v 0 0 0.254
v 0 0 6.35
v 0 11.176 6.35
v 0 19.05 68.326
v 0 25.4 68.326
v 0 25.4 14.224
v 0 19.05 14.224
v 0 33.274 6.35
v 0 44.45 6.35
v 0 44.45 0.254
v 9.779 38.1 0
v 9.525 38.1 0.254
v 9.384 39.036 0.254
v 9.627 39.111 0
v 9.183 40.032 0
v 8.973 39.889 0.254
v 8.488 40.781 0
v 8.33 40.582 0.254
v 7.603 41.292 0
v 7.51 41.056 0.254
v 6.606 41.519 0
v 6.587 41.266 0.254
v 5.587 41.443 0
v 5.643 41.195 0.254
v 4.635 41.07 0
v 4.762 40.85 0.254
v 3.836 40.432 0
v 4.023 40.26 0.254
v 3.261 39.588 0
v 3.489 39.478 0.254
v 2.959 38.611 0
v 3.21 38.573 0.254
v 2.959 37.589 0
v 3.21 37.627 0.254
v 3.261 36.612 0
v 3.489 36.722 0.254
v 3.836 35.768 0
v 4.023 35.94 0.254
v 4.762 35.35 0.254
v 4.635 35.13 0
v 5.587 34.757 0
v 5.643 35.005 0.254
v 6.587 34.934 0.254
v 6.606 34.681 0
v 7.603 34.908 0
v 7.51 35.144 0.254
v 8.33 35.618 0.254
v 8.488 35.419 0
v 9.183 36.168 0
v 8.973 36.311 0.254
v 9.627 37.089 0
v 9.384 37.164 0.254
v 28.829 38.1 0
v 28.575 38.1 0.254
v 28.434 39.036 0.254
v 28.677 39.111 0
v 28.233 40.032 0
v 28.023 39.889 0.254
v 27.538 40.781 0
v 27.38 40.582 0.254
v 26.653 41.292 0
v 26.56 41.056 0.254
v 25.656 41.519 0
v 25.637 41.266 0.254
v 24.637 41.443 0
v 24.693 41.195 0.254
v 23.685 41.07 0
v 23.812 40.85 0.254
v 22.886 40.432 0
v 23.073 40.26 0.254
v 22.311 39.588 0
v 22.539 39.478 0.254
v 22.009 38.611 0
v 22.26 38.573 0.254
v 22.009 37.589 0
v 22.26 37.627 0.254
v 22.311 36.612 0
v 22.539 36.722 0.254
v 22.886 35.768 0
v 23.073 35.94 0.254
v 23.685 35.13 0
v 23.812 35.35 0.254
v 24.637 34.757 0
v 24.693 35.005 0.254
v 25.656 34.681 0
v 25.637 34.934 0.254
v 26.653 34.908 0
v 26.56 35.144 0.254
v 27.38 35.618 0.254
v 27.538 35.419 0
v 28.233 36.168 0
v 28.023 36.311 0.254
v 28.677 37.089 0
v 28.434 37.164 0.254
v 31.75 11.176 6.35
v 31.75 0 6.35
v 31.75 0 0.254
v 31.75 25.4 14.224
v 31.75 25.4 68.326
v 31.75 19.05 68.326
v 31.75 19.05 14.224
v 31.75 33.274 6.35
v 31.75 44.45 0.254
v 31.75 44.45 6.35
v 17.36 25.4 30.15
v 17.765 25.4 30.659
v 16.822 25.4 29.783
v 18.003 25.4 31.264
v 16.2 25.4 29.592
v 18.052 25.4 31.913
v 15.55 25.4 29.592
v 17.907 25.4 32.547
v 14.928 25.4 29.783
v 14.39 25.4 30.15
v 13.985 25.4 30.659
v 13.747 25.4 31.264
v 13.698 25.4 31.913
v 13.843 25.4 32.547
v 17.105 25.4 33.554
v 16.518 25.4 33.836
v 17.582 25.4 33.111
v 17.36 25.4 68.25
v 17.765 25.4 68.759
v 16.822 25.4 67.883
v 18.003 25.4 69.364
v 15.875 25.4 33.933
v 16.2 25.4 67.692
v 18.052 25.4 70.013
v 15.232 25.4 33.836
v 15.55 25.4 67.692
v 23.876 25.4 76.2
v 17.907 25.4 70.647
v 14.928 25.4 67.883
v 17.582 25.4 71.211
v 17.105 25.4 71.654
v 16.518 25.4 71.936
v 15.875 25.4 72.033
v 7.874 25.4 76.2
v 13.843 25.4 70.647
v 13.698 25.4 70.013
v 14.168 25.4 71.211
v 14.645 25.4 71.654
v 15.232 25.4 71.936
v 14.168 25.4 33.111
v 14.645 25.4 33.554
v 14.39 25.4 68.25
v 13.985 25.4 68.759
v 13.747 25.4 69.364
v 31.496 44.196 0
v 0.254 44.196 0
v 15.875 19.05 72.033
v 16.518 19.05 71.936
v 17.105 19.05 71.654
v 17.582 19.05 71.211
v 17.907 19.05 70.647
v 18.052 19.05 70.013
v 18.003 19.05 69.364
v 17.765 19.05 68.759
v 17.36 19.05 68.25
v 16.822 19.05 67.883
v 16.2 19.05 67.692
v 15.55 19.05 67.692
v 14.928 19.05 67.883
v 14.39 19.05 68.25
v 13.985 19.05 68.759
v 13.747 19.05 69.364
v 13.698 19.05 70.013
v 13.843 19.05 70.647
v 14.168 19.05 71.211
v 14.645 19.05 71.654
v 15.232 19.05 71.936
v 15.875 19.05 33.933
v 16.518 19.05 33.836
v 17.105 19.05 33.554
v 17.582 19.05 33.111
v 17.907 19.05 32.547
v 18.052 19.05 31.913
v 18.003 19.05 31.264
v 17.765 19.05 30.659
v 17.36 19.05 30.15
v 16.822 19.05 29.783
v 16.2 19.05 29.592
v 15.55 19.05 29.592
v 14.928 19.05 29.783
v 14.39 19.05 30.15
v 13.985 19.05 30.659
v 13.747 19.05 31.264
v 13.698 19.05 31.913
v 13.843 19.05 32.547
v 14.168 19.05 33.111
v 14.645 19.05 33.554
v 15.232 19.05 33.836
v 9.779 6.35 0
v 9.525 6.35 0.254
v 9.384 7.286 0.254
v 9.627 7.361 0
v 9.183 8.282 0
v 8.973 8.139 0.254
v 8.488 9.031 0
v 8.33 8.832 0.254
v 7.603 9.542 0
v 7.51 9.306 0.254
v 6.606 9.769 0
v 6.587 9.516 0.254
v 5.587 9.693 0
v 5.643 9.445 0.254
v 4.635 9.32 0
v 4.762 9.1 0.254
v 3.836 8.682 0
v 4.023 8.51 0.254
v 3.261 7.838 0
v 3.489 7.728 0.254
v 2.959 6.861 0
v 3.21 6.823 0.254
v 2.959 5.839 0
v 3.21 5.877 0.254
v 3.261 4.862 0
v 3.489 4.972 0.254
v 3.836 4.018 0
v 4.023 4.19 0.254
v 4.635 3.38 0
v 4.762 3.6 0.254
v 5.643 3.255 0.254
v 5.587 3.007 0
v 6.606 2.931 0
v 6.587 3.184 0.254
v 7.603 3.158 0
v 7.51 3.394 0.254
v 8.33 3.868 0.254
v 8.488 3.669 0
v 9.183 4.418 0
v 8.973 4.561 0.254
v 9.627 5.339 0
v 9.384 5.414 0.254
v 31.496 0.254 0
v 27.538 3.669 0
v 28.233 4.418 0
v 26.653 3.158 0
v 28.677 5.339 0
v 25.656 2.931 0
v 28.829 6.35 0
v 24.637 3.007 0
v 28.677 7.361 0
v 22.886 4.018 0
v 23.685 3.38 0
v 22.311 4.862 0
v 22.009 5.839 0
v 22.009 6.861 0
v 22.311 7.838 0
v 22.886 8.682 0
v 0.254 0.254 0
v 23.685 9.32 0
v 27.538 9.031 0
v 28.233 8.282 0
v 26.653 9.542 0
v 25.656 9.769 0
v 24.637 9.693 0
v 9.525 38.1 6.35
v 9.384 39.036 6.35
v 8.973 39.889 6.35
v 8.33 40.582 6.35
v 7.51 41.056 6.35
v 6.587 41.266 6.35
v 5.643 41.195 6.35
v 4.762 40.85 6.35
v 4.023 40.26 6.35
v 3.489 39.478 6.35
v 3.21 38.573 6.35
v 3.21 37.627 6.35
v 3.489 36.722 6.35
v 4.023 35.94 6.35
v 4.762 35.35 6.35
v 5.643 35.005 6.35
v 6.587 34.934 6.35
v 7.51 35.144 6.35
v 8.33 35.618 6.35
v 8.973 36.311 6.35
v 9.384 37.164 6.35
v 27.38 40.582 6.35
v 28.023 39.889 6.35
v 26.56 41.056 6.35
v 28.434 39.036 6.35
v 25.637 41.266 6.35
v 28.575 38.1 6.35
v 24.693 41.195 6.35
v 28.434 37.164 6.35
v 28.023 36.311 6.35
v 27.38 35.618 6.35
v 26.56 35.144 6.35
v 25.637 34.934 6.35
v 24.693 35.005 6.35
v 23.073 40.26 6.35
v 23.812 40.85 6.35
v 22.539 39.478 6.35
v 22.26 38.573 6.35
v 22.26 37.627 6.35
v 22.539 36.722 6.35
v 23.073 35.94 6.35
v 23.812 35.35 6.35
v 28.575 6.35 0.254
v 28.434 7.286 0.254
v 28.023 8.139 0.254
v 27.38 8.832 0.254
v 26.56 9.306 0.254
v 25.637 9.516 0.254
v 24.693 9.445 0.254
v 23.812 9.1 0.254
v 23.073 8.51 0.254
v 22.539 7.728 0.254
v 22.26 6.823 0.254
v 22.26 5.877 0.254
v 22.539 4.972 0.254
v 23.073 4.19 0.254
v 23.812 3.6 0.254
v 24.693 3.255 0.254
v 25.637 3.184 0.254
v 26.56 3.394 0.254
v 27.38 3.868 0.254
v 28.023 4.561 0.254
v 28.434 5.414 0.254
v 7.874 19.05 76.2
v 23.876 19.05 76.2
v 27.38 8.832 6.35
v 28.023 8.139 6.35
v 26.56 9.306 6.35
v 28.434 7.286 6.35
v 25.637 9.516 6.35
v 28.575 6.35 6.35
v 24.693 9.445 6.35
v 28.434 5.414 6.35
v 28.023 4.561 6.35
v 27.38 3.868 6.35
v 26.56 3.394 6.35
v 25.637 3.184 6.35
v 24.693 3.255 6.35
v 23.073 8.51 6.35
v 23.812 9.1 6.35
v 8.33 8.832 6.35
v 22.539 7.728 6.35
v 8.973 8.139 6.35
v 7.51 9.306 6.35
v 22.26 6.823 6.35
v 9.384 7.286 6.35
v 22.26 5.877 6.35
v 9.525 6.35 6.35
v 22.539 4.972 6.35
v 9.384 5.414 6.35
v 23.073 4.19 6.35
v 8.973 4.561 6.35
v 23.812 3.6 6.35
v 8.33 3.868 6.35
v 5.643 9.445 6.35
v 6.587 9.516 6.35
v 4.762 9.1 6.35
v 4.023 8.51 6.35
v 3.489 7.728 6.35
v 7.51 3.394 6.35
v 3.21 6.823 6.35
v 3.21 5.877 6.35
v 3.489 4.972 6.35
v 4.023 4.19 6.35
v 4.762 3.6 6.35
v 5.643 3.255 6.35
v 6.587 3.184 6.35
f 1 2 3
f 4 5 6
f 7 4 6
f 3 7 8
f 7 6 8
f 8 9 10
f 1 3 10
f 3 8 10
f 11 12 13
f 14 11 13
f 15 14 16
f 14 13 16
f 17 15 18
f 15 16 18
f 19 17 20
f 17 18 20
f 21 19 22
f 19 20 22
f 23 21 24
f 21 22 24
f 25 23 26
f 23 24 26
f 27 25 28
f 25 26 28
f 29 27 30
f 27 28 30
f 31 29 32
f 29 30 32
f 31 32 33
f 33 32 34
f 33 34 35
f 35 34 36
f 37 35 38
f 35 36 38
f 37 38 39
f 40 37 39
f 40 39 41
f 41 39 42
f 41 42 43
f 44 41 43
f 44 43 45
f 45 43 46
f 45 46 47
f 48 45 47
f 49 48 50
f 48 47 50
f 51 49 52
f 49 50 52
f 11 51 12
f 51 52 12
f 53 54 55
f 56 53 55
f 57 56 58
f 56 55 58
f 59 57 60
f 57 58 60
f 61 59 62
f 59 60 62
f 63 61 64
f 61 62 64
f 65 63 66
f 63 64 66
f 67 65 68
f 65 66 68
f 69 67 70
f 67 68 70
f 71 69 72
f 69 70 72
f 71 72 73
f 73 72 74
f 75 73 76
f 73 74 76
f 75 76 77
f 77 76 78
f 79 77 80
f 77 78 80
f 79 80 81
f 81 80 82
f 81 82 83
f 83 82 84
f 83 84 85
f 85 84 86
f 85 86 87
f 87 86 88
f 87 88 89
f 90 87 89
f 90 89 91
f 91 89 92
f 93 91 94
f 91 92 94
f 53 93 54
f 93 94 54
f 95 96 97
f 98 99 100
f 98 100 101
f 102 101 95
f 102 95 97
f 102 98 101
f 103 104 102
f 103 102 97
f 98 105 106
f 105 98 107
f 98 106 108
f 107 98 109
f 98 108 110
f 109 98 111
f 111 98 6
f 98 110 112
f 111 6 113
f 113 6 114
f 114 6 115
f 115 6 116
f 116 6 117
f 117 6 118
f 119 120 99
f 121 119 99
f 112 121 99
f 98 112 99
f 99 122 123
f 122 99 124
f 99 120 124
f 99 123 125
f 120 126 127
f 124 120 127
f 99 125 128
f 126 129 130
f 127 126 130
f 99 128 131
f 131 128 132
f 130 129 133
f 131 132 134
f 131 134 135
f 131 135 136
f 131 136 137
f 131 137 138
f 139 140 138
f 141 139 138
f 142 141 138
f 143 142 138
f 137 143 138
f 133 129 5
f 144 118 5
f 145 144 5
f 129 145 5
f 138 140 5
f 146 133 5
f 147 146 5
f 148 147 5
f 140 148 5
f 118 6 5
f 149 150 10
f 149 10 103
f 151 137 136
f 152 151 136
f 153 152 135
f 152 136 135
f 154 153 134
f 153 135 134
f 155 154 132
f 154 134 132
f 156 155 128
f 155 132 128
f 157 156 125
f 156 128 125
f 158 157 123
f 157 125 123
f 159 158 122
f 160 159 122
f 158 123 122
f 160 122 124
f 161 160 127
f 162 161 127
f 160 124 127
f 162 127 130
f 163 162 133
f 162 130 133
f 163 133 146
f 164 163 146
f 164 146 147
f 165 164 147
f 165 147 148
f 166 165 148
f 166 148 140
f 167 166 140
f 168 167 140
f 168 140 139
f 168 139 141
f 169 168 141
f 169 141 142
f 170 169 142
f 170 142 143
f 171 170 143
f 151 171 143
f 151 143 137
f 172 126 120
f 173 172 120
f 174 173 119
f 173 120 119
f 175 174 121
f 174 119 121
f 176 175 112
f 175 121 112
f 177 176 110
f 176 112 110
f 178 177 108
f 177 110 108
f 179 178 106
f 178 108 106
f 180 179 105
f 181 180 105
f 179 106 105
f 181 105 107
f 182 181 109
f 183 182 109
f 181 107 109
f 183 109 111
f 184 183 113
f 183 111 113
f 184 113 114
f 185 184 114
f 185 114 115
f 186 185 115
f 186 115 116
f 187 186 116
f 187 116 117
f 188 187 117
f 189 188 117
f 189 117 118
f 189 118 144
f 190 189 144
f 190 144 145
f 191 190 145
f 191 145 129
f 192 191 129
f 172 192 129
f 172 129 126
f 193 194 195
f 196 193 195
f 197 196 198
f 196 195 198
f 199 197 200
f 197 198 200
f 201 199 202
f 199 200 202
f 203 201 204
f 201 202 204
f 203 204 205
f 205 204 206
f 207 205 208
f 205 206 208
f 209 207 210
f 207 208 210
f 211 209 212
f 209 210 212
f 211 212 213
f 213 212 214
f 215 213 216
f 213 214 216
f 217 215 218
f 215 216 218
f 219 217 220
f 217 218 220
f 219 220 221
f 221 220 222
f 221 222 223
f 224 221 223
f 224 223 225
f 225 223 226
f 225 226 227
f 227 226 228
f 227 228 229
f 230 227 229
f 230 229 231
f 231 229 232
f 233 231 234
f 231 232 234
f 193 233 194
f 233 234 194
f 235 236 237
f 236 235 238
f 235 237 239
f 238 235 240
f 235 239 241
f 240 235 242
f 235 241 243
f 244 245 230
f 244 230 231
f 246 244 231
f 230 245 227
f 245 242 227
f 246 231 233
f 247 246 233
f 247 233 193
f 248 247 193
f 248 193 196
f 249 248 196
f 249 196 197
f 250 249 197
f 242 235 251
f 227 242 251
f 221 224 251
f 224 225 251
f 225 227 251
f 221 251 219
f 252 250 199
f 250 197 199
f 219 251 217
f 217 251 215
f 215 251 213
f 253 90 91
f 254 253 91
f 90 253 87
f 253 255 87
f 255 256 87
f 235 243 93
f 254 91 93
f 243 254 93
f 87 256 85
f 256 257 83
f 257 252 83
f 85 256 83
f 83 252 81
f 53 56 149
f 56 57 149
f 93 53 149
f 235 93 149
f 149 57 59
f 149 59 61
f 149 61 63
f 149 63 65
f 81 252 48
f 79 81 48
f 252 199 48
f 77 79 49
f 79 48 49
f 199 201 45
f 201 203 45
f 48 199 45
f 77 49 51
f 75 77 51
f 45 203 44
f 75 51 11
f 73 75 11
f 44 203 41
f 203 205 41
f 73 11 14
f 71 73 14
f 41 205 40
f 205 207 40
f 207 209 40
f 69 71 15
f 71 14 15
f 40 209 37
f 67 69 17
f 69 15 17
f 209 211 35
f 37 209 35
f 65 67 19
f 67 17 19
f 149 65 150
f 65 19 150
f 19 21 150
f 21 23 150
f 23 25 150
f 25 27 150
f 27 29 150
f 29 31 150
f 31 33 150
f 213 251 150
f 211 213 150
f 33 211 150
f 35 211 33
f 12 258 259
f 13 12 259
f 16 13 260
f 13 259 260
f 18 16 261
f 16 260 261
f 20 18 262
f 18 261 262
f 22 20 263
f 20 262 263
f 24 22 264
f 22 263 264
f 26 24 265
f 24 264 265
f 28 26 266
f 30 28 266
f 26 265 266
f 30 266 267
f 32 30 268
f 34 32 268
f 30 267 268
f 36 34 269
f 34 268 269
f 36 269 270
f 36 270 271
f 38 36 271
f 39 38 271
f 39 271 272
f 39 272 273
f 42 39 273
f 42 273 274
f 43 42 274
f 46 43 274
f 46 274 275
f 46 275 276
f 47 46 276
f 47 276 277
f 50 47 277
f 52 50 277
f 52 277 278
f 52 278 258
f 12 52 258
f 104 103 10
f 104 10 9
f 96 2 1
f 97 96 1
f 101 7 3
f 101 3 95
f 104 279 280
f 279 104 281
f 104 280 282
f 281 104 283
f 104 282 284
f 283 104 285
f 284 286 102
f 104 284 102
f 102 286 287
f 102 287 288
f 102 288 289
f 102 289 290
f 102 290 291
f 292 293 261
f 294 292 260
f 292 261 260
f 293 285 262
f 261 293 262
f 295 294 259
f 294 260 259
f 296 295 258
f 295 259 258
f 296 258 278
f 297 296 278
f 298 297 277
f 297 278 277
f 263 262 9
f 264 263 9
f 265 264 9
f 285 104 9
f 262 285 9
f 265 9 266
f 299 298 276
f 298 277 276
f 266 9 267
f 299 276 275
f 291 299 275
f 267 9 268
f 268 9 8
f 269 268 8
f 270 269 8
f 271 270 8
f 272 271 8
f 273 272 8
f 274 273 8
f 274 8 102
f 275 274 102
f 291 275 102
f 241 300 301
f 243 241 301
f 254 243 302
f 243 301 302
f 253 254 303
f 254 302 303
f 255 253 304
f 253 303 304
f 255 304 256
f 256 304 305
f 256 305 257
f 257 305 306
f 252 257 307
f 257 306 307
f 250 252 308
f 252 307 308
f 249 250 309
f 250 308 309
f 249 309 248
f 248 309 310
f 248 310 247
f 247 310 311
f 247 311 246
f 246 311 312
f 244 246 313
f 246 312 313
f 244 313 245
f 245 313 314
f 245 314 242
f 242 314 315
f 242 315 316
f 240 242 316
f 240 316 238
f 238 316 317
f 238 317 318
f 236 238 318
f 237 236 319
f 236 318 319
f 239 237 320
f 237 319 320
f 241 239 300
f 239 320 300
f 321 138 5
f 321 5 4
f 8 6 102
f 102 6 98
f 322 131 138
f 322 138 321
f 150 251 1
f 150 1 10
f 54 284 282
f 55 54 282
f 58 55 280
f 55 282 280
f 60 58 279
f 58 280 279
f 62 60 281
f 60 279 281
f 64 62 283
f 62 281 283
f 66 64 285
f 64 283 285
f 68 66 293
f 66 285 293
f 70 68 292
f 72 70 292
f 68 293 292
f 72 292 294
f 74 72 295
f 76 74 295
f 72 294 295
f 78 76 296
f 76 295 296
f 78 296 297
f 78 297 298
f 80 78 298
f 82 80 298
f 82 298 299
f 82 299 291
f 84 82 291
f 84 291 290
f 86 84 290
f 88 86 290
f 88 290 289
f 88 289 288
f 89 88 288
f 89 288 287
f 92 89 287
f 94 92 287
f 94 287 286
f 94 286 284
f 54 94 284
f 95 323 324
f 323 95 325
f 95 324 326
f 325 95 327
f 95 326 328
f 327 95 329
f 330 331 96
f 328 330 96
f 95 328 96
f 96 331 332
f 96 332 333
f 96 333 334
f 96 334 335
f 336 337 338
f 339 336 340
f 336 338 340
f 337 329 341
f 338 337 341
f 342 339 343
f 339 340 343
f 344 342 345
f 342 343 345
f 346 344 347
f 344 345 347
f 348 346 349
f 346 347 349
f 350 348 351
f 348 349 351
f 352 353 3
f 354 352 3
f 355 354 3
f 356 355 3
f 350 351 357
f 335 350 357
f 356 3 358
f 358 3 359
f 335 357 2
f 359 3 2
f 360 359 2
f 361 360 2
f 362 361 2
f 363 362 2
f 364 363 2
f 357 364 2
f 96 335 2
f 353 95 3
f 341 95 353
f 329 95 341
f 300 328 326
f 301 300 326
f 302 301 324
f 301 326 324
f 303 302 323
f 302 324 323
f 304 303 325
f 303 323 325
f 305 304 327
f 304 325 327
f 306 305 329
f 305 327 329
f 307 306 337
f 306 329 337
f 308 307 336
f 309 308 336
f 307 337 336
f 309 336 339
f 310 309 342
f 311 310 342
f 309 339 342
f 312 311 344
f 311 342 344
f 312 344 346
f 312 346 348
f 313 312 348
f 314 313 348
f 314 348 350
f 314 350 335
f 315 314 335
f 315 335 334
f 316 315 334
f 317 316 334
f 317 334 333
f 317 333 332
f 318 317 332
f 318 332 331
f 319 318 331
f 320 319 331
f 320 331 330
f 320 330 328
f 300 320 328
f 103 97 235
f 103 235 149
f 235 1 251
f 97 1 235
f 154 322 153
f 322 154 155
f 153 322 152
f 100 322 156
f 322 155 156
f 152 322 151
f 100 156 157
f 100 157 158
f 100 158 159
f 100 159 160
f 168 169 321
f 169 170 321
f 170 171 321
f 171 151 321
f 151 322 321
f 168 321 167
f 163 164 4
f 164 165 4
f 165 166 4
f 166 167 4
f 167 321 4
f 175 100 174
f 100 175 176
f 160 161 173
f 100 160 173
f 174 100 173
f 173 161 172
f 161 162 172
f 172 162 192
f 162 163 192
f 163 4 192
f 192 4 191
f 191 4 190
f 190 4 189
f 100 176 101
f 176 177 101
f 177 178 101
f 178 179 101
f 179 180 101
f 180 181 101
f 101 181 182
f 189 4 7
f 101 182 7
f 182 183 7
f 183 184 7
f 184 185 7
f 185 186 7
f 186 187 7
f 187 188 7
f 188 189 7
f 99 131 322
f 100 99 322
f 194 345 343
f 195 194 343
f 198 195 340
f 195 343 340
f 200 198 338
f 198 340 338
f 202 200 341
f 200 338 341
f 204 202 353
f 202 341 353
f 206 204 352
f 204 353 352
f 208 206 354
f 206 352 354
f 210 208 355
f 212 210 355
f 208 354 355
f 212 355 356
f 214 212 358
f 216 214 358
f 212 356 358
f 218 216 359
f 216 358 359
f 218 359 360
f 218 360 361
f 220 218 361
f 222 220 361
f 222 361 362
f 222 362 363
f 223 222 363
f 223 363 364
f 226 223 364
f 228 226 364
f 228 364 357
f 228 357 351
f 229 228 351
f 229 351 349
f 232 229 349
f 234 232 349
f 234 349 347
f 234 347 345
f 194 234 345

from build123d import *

# Parameters (mm, degrees)
BOSS_EXTRUDE1_DEPTH = 31.75
SKETCH2_R           = 3.175
CUT_EXTRUDE1_DEPTH  = 19.05
CHAMFER1_SIZE       = 7.874
SKETCH3_R           = 2.1828125
CUT_EXTRUDE2_DEPTH  = 19.05
CHAMFER2_SIZE       = 7.874
CHAMFER3_SIZE       = 0.254


with BuildPart() as part:
    # Sketch1 → Boss-Extrude1 (new body)
    with BuildSketch(Plane(origin=(0, 0, 0), x_dir=(0, 0, -1), z_dir=(1, 0, 0))):
        Polygon((0, 0), (0, 44.45), (-6.35, 44.45), (-6.35, 25.4), (-76.2, 25.4), (-76.2, 19.05), (-6.35, 19.05), (-6.35, 0), align=None)
    extrude(amount=BOSS_EXTRUDE1_DEPTH)

    # Sketch2 → Cut-Extrude1 (cut)
    with BuildSketch(Plane.XY.offset(6.35)):
        with Locations((6.35, 38.1)):
            Circle(SKETCH2_R)
        with Locations((25.4, 38.1)):
            Circle(SKETCH2_R)
        with Locations((6.35, 6.35)):
            Circle(SKETCH2_R)
        with Locations((25.4, 6.35)):
            Circle(SKETCH2_R)
    extrude(amount=-CUT_EXTRUDE1_DEPTH, mode=Mode.SUBTRACT)

    # Chamfer1
    chamfer1_edges = [part.edges().sort_by_distance(p)[0] for p in [
        (15.875, 19.05, 6.35),
        (15.875, 25.4, 6.35),
    ]]
    chamfer(chamfer1_edges, length=CHAMFER1_SIZE)

    # Sketch3 → Cut-Extrude2 (cut)
    with BuildSketch(Plane(origin=(0, 25.4, 0), x_dir=(1, 0, 0), z_dir=(0, 1, 0))):
        with Locations(Location((15.875, -69.85, 0), (0, 0, 270))):
            Circle(SKETCH3_R)
        with Locations(Location((15.875, -31.75, 0), (0, 0, 270))):
            Circle(SKETCH3_R)
    extrude(amount=-CUT_EXTRUDE2_DEPTH, mode=Mode.SUBTRACT)

    # Chamfer2
    chamfer2_edges = [part.edges().sort_by_distance(p)[0] for p in [
        (31.75, 22.225, 76.2),
        (0, 22.225, 76.2),
    ]]
    chamfer(chamfer2_edges, length=CHAMFER2_SIZE)

    # Chamfer3
    chamfer3_edges = [part.edges().sort_by_distance(p)[0] for p in [
        (0, 22.225, 0),
        (15.875, 44.45, 0),
        (15.875, 0, 0),
        (22.225, 38.1, 0),
        (3.175, 6.35, 0),
        (22.225, 6.35, 0),
        (3.175, 38.1, 0),
        (31.75, 22.225, 0),
    ]]
    chamfer(chamfer3_edges, length=CHAMFER3_SIZE)


solid = part.part
